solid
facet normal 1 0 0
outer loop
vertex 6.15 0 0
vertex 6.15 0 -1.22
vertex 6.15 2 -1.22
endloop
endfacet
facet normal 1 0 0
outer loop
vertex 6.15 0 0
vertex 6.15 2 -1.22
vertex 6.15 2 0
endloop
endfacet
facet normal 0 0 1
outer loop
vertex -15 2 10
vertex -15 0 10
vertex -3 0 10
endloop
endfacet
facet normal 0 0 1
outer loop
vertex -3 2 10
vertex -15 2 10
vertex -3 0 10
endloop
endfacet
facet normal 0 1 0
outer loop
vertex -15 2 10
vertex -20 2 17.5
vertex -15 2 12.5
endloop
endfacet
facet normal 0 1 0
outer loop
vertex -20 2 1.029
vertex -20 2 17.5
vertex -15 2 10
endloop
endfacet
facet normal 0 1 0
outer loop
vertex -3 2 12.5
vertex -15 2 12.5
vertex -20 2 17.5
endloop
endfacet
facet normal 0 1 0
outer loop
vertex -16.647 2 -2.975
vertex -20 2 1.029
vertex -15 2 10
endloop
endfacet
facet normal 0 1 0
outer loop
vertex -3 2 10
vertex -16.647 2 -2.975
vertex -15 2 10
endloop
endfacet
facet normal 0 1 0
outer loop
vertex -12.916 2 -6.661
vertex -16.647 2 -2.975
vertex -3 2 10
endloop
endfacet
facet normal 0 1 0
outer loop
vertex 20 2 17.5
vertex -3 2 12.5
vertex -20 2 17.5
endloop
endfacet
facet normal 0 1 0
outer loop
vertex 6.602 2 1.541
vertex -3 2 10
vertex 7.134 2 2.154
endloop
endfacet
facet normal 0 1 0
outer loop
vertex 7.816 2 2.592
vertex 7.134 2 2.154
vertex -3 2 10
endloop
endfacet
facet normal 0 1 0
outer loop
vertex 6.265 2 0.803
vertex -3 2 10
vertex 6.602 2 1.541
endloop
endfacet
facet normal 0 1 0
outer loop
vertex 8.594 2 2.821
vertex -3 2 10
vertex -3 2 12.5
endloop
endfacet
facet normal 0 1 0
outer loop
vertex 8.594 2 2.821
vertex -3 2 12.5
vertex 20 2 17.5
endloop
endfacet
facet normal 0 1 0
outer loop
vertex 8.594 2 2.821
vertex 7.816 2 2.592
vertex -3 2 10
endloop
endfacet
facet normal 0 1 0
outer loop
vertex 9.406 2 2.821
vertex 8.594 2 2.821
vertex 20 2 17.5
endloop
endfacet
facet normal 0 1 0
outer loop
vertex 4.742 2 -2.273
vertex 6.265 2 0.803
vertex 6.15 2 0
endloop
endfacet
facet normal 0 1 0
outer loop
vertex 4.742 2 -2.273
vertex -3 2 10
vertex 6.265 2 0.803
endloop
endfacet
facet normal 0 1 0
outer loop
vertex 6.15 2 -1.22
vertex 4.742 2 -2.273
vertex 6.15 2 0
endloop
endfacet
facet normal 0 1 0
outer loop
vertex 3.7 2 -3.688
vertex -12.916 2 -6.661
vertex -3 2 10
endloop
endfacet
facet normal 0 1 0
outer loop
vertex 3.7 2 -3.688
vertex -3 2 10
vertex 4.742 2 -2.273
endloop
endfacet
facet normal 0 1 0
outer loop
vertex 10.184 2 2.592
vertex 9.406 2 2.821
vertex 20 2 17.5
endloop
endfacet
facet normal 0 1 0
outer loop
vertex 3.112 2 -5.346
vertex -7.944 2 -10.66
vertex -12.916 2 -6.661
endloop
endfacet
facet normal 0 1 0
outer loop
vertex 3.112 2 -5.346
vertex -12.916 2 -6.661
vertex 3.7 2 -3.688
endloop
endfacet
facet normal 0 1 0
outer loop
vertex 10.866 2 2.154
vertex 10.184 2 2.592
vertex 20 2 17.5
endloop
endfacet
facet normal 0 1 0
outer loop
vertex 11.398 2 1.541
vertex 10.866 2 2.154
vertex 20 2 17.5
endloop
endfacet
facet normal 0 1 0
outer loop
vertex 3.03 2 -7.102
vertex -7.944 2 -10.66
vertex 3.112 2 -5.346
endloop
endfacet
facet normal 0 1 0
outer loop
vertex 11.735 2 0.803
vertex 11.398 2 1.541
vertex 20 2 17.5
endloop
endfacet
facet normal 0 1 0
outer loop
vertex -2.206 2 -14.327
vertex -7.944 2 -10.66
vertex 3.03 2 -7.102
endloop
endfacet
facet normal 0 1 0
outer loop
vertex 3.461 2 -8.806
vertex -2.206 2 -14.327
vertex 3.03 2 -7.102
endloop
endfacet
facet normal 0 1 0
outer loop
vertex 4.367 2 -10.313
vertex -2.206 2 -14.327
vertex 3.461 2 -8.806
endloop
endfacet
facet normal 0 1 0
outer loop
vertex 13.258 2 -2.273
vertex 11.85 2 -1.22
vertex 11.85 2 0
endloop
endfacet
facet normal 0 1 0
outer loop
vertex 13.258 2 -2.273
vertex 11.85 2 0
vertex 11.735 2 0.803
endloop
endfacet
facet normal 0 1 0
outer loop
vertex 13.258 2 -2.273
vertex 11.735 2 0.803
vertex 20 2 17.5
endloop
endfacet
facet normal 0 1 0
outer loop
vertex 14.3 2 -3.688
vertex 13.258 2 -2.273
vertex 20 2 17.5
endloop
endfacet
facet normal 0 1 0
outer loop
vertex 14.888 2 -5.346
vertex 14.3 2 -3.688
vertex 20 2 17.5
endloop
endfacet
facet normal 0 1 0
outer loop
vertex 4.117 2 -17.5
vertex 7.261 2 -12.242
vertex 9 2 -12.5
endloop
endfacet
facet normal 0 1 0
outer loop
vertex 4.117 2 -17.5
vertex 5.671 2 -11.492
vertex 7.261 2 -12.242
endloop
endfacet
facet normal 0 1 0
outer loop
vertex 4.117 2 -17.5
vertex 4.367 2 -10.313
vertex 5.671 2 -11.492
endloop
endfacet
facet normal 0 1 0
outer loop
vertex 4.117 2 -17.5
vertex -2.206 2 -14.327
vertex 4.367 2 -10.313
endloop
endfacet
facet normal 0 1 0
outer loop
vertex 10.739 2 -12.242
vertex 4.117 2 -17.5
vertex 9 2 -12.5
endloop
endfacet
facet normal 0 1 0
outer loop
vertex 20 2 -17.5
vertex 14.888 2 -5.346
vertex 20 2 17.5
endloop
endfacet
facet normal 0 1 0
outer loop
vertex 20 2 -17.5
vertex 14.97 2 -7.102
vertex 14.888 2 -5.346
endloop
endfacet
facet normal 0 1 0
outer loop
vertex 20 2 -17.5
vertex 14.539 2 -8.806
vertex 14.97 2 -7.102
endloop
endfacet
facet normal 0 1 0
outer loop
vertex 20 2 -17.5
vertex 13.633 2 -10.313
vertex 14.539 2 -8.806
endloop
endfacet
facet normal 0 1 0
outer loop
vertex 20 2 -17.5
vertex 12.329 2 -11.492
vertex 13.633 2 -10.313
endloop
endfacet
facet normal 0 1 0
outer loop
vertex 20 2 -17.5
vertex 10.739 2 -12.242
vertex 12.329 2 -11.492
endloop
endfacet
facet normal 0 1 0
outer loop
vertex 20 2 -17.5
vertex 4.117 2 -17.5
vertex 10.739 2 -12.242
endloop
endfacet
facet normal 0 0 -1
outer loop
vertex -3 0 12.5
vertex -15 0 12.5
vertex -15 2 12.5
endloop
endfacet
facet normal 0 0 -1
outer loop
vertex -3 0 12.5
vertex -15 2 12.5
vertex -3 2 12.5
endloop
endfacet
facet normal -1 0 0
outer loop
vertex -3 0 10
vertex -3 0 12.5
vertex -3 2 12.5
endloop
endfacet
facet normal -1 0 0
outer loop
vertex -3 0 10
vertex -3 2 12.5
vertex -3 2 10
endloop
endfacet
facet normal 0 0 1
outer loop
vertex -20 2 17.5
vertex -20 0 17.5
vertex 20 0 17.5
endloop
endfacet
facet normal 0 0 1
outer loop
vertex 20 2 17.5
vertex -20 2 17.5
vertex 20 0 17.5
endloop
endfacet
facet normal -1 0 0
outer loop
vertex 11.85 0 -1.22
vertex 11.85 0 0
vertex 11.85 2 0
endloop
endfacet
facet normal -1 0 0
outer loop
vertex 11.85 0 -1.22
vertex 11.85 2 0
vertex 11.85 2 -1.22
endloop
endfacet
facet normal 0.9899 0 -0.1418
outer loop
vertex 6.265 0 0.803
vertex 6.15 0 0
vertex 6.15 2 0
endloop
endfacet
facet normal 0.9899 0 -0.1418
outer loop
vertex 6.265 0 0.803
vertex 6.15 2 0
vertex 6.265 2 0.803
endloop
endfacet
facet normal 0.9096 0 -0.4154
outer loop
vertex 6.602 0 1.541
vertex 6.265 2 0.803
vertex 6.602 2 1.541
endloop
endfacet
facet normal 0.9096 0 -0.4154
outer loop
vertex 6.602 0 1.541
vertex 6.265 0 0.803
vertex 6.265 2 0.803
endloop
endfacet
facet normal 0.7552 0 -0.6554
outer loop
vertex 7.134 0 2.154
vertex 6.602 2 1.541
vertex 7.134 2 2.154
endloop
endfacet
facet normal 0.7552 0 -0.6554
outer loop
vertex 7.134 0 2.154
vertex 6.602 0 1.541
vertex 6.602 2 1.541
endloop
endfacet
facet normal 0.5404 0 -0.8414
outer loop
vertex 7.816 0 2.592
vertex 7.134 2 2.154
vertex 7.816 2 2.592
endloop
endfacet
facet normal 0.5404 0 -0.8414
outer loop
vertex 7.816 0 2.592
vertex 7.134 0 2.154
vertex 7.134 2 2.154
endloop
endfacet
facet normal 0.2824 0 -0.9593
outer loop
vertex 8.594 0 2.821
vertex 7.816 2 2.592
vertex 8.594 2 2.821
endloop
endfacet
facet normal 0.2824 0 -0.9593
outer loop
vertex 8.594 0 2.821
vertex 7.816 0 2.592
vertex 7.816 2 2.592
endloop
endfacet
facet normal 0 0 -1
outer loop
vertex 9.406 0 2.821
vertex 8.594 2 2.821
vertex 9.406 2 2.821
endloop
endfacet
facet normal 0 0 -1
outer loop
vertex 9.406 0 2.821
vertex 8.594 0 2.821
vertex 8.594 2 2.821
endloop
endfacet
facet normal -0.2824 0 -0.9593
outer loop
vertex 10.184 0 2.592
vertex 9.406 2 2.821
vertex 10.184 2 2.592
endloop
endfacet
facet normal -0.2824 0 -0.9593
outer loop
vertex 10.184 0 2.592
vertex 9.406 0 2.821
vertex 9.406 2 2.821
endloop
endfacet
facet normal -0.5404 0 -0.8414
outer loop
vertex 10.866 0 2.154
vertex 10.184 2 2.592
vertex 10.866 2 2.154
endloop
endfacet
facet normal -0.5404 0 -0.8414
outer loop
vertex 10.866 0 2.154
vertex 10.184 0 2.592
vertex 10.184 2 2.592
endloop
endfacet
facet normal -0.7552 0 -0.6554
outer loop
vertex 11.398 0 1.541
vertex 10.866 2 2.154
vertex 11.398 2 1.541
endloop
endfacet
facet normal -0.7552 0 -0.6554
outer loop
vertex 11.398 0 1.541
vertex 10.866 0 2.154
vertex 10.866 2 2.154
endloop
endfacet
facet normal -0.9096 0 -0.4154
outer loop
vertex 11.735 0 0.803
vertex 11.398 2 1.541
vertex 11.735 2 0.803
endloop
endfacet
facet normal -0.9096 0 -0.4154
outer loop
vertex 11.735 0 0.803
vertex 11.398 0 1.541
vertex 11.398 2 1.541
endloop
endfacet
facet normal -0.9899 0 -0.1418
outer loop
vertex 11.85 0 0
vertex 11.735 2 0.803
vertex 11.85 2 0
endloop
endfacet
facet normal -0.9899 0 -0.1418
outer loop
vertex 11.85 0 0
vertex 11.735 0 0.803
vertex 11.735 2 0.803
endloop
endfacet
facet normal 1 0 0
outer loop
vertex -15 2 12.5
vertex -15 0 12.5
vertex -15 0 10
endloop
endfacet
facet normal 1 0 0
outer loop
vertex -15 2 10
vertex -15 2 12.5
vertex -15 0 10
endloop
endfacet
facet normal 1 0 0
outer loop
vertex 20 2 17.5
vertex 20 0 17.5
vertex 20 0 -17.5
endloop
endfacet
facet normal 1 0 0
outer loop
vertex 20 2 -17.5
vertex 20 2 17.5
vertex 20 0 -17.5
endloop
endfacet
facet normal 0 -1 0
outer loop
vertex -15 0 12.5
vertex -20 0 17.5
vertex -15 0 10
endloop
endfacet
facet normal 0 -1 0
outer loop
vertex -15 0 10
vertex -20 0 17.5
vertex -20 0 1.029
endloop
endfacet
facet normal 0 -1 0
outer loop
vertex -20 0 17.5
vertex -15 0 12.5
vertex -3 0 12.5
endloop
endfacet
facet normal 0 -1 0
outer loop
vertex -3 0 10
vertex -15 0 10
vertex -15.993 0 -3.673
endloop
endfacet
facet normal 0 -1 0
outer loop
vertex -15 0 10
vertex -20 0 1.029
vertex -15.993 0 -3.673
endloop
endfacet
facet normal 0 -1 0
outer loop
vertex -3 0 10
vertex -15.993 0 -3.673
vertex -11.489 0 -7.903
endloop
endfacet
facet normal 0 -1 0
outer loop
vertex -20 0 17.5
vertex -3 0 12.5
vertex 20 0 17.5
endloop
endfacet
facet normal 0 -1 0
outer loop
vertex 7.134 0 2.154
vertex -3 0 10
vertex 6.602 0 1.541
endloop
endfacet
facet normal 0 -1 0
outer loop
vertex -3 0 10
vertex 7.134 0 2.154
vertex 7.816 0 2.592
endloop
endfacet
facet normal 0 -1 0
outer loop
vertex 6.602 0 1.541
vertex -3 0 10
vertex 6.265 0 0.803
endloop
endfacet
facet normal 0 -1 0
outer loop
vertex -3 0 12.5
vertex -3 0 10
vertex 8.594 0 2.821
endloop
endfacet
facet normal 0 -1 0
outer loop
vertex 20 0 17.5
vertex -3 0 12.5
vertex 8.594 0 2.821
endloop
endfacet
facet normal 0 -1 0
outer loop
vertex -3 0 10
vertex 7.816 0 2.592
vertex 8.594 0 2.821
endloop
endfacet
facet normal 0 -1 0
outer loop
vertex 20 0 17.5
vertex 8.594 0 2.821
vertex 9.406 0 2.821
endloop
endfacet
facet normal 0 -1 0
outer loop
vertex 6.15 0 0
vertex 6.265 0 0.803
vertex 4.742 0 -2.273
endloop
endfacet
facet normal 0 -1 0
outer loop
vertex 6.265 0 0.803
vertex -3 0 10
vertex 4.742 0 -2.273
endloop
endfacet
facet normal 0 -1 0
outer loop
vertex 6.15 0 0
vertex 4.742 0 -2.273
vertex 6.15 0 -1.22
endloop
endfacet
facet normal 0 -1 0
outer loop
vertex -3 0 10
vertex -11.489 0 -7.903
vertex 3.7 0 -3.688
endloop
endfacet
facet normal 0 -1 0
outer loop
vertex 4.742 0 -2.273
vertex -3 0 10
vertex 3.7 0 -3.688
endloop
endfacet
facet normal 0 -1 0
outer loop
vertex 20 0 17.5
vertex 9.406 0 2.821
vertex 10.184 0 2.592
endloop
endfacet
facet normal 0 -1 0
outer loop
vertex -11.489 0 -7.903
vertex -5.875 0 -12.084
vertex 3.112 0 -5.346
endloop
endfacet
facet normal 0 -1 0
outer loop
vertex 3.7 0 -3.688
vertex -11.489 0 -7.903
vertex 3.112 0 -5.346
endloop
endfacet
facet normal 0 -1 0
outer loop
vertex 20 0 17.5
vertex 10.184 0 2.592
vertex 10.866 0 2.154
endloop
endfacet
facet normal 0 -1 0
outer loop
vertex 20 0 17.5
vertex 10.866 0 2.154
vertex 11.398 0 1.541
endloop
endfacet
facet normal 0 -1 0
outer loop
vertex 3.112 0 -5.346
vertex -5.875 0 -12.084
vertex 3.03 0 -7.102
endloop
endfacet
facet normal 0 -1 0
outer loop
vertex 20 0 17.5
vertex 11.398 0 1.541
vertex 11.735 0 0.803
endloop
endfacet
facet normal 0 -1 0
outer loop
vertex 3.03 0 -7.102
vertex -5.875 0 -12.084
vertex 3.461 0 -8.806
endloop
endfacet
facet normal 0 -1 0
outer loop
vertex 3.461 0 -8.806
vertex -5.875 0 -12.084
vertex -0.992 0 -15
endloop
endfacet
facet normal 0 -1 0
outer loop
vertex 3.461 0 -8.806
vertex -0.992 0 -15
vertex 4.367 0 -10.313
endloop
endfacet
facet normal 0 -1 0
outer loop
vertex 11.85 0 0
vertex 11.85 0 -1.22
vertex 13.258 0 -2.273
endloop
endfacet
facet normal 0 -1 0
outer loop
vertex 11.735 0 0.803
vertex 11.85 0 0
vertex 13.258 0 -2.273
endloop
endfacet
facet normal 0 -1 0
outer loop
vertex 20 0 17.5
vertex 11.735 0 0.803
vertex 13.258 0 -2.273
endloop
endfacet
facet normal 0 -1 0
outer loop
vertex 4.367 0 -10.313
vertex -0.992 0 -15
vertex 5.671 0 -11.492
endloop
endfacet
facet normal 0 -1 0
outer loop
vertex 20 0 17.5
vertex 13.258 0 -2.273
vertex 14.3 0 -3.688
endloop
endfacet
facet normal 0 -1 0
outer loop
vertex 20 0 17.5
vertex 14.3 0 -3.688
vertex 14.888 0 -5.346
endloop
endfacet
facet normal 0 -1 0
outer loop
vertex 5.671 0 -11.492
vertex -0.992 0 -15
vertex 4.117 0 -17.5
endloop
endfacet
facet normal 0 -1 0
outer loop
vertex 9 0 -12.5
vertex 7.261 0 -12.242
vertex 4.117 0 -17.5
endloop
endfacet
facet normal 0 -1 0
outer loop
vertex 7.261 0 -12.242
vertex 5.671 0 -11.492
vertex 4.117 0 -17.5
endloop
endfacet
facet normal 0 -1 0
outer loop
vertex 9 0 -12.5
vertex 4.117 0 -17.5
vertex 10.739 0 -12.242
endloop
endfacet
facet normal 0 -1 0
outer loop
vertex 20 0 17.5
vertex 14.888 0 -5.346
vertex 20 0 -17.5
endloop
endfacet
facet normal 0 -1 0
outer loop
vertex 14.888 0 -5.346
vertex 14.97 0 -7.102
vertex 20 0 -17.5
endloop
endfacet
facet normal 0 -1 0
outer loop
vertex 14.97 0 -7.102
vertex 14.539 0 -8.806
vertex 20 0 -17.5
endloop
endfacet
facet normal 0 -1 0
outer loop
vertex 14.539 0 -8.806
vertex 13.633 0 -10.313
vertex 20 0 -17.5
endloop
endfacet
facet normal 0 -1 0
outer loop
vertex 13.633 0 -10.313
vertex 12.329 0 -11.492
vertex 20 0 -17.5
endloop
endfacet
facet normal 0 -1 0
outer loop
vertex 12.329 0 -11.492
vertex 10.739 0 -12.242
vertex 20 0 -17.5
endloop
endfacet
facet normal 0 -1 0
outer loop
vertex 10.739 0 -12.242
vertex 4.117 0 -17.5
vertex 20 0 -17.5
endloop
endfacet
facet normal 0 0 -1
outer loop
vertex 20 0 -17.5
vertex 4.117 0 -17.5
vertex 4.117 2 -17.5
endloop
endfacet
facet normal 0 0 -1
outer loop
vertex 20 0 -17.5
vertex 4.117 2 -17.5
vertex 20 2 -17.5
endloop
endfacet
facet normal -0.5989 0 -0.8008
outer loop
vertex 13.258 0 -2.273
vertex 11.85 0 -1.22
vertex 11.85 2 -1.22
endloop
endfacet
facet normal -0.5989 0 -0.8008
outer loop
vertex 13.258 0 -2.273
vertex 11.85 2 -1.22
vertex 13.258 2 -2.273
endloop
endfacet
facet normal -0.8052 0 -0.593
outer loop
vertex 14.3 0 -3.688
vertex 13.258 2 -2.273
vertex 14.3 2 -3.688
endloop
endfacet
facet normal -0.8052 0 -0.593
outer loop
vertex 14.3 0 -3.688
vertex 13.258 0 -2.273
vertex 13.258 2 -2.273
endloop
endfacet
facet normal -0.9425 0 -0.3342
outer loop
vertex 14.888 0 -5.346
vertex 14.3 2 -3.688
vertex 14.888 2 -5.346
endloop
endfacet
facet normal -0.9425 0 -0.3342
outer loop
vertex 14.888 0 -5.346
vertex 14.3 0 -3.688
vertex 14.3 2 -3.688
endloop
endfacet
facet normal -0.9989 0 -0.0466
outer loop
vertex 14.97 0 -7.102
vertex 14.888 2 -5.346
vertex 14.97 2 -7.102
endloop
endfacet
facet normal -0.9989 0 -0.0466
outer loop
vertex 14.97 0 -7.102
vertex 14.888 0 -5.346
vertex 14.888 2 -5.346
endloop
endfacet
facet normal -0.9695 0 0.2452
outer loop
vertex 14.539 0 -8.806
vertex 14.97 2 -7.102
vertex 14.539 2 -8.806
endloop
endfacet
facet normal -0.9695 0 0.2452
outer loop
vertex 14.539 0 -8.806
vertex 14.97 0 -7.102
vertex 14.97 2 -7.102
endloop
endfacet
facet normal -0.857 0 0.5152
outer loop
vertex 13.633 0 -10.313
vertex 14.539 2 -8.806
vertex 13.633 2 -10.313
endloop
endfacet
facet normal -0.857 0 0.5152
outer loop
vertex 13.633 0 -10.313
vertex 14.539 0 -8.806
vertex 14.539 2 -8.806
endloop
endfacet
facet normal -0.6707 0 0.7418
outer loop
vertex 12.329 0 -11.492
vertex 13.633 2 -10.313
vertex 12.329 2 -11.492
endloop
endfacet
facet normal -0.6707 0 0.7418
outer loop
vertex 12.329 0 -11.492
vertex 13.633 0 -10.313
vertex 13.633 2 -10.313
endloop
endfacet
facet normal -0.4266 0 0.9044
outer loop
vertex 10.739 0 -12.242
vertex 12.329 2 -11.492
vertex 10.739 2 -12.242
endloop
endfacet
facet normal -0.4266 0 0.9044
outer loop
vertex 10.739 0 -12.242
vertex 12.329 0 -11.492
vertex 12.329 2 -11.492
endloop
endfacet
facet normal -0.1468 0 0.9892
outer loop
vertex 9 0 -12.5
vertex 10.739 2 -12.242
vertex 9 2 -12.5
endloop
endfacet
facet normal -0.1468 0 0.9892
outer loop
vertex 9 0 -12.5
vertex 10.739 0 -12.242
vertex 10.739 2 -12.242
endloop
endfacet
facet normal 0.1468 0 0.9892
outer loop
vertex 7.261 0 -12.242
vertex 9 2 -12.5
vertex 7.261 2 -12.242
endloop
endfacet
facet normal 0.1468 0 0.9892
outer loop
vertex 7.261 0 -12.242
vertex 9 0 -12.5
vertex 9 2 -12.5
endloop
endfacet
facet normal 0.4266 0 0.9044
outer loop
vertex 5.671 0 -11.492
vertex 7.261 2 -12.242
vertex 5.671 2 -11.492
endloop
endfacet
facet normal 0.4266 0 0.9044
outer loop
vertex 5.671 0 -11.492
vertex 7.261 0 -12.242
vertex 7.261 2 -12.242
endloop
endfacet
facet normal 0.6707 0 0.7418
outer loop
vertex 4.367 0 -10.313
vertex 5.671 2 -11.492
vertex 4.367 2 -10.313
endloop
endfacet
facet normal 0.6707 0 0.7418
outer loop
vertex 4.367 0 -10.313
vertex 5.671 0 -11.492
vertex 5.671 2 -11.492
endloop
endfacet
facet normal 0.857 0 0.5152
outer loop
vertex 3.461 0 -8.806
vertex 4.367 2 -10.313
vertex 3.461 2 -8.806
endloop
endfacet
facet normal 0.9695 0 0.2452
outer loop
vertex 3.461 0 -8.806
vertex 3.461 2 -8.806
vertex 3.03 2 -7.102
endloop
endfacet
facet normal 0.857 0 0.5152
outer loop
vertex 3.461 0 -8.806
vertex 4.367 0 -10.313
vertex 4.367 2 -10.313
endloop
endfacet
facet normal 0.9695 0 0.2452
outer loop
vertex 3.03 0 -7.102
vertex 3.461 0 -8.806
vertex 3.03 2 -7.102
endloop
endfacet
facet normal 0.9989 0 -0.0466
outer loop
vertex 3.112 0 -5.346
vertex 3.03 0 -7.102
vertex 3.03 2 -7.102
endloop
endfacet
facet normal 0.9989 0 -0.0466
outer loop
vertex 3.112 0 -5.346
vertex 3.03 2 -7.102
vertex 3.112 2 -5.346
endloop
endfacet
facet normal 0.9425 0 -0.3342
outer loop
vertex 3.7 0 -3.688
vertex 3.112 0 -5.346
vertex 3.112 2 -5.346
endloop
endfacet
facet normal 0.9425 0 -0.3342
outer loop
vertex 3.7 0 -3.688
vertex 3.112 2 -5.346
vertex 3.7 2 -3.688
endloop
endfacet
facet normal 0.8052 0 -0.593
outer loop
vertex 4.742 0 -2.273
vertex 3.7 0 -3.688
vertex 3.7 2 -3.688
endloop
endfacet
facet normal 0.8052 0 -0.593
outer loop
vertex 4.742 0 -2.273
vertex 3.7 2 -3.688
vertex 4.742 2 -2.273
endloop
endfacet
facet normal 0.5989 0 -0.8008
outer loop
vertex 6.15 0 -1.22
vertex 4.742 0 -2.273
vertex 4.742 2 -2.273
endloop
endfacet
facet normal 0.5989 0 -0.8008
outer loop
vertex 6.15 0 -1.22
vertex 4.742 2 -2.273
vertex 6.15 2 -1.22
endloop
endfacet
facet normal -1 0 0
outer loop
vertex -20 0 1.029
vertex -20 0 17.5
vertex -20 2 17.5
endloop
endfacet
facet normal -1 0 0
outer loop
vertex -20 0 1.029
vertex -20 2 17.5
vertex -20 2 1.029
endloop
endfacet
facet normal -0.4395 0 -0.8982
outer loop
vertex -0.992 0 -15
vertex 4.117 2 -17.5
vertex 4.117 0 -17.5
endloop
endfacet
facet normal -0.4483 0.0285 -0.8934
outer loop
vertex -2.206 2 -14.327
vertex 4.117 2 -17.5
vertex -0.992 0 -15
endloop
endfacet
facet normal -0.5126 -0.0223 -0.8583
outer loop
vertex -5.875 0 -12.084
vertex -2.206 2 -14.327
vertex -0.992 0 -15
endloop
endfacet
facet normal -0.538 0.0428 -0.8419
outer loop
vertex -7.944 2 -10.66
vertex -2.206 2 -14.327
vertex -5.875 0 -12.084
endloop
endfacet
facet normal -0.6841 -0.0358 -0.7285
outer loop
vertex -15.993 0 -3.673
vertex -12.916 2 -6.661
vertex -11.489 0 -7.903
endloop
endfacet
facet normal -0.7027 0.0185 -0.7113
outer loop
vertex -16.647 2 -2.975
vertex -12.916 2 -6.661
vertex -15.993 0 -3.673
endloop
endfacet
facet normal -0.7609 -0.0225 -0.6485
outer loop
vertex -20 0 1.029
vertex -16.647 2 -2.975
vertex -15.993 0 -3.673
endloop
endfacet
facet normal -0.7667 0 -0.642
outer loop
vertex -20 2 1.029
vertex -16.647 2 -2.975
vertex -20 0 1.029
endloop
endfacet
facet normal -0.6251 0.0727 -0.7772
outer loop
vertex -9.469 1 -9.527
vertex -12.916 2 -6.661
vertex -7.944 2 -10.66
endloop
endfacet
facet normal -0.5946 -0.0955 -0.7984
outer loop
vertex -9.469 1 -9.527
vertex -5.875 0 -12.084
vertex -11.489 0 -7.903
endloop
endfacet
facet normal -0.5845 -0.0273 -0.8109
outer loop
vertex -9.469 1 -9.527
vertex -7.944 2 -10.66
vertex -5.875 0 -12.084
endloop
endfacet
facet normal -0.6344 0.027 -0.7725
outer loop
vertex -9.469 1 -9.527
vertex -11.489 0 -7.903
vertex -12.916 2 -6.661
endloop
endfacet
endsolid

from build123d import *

# Parameters (mm, degrees)
ESQUISSE1_W             = 40
ESQUISSE1_H             = 35
ESQUISSE1_W_2           = 12
ESQUISSE1_H_2           = 2.5
BOSS_EXTRU_1_DEPTH      = 2
ENL_V_MAT_EXTRU_1_DEPTH = 10


with BuildPart() as part:
    # Esquisse1 → Boss.-Extru.1 (new body)
    with BuildSketch(Plane(origin=(0, 0, 0), x_dir=(1, 0, 0), z_dir=(0, 1, 0))):
        Rectangle(ESQUISSE1_W, ESQUISSE1_H)
        with BuildLine():
            Line((6.15, 1.220085228), (6.15, 0))
            ThreePointArc((6.15, 0), (9, -2.85), (11.85, 0))
            Line((11.85, 0), (11.85, 1.220085228))
            ThreePointArc((11.85, 1.220085228), (9, 12.5), (6.15, 1.220085228))
        make_face(mode=Mode.SUBTRACT)
        with Locations((-9, -11.25)):
            Rectangle(ESQUISSE1_W_2, ESQUISSE1_H_2, mode=Mode.SUBTRACT)
    extrude(amount=BOSS_EXTRU_1_DEPTH)

    # Esquisse2 → Enlèv. mat.-Extru.1 (cut)
    with BuildSketch(Plane(origin=(0, 2, 0), x_dir=(1, 0, 0), z_dir=(0, 1, 0))):
        with BuildLine():
            Line((-28.745227889, -17.5), (-25.633077883, 26.552925175))
            Line((-25.633077883, 26.552925175), (4.116600537, 17.5))
            add(Edge.make_bspline(
                [(4.116600537, 17.5), (-20.262864911, 6.720677368), (-28.745227889, -17.5)],
                knots=[0, 0, 0, 1, 1, 1], degree=2))
        make_face()
    extrude(amount=-ENL_V_MAT_EXTRU_1_DEPTH, mode=Mode.SUBTRACT)


solid = part.part
